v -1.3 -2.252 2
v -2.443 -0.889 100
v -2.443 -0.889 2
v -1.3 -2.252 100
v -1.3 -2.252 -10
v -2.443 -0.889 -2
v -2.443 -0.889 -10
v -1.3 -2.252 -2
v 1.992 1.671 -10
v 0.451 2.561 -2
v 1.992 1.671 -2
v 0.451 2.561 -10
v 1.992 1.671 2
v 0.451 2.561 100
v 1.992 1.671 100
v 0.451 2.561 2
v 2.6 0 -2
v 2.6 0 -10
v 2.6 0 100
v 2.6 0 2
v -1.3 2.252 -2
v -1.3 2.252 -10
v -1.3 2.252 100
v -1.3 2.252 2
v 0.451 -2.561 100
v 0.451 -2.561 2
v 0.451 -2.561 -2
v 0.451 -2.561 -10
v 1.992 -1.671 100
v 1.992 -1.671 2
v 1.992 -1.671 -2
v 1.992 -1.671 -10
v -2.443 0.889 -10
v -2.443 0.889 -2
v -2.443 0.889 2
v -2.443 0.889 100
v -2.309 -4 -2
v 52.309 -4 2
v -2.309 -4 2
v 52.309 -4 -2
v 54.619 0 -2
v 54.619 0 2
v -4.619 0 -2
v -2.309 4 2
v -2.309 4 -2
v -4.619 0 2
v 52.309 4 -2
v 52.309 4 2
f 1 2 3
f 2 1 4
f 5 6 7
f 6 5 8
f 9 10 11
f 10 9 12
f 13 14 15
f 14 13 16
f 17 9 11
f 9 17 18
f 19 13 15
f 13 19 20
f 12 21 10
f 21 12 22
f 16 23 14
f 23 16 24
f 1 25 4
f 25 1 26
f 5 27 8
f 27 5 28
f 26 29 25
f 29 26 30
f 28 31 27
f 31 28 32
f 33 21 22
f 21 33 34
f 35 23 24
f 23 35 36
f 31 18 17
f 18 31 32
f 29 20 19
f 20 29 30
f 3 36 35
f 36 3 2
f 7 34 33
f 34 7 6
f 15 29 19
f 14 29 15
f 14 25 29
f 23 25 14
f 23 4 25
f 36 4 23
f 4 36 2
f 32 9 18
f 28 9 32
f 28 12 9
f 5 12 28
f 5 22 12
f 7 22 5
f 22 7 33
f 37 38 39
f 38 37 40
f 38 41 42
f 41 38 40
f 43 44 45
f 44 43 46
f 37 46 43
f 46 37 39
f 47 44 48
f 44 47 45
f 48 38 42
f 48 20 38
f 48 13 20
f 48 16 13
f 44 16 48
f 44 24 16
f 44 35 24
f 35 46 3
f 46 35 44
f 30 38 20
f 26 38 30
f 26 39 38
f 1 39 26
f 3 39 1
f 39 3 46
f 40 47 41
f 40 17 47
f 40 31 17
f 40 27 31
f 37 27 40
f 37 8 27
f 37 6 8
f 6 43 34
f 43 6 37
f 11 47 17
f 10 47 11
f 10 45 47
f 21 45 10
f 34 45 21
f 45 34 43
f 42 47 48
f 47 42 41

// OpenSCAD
module nut(height, width){
  let ($fn=6, d=width/sqrt(3/4)){
    cylinder(h=height, d=d, center=true);
  }
}

module captive_nut_m5(depth=50, $tolerance=0) {
  hull(){
    nut(4+2*$tolerance,8+2*$tolerance);
    translate([depth,0,0])nut(4+2*$tolerance,8+2*$tolerance);
  }
}

module captive_nut_screw_hole_m5(depth_nut=50, depth_top=100, depth_bottom=10, $tolerance=0) {
  translate([0,0,-depth_bottom])cylinder(d=5+2*$tolerance, h=depth_top+depth_bottom);
  captive_nut_m5(depth_nut, $tolerance);
}

captive_nut_screw_hole_m5($tolerance=.1);
